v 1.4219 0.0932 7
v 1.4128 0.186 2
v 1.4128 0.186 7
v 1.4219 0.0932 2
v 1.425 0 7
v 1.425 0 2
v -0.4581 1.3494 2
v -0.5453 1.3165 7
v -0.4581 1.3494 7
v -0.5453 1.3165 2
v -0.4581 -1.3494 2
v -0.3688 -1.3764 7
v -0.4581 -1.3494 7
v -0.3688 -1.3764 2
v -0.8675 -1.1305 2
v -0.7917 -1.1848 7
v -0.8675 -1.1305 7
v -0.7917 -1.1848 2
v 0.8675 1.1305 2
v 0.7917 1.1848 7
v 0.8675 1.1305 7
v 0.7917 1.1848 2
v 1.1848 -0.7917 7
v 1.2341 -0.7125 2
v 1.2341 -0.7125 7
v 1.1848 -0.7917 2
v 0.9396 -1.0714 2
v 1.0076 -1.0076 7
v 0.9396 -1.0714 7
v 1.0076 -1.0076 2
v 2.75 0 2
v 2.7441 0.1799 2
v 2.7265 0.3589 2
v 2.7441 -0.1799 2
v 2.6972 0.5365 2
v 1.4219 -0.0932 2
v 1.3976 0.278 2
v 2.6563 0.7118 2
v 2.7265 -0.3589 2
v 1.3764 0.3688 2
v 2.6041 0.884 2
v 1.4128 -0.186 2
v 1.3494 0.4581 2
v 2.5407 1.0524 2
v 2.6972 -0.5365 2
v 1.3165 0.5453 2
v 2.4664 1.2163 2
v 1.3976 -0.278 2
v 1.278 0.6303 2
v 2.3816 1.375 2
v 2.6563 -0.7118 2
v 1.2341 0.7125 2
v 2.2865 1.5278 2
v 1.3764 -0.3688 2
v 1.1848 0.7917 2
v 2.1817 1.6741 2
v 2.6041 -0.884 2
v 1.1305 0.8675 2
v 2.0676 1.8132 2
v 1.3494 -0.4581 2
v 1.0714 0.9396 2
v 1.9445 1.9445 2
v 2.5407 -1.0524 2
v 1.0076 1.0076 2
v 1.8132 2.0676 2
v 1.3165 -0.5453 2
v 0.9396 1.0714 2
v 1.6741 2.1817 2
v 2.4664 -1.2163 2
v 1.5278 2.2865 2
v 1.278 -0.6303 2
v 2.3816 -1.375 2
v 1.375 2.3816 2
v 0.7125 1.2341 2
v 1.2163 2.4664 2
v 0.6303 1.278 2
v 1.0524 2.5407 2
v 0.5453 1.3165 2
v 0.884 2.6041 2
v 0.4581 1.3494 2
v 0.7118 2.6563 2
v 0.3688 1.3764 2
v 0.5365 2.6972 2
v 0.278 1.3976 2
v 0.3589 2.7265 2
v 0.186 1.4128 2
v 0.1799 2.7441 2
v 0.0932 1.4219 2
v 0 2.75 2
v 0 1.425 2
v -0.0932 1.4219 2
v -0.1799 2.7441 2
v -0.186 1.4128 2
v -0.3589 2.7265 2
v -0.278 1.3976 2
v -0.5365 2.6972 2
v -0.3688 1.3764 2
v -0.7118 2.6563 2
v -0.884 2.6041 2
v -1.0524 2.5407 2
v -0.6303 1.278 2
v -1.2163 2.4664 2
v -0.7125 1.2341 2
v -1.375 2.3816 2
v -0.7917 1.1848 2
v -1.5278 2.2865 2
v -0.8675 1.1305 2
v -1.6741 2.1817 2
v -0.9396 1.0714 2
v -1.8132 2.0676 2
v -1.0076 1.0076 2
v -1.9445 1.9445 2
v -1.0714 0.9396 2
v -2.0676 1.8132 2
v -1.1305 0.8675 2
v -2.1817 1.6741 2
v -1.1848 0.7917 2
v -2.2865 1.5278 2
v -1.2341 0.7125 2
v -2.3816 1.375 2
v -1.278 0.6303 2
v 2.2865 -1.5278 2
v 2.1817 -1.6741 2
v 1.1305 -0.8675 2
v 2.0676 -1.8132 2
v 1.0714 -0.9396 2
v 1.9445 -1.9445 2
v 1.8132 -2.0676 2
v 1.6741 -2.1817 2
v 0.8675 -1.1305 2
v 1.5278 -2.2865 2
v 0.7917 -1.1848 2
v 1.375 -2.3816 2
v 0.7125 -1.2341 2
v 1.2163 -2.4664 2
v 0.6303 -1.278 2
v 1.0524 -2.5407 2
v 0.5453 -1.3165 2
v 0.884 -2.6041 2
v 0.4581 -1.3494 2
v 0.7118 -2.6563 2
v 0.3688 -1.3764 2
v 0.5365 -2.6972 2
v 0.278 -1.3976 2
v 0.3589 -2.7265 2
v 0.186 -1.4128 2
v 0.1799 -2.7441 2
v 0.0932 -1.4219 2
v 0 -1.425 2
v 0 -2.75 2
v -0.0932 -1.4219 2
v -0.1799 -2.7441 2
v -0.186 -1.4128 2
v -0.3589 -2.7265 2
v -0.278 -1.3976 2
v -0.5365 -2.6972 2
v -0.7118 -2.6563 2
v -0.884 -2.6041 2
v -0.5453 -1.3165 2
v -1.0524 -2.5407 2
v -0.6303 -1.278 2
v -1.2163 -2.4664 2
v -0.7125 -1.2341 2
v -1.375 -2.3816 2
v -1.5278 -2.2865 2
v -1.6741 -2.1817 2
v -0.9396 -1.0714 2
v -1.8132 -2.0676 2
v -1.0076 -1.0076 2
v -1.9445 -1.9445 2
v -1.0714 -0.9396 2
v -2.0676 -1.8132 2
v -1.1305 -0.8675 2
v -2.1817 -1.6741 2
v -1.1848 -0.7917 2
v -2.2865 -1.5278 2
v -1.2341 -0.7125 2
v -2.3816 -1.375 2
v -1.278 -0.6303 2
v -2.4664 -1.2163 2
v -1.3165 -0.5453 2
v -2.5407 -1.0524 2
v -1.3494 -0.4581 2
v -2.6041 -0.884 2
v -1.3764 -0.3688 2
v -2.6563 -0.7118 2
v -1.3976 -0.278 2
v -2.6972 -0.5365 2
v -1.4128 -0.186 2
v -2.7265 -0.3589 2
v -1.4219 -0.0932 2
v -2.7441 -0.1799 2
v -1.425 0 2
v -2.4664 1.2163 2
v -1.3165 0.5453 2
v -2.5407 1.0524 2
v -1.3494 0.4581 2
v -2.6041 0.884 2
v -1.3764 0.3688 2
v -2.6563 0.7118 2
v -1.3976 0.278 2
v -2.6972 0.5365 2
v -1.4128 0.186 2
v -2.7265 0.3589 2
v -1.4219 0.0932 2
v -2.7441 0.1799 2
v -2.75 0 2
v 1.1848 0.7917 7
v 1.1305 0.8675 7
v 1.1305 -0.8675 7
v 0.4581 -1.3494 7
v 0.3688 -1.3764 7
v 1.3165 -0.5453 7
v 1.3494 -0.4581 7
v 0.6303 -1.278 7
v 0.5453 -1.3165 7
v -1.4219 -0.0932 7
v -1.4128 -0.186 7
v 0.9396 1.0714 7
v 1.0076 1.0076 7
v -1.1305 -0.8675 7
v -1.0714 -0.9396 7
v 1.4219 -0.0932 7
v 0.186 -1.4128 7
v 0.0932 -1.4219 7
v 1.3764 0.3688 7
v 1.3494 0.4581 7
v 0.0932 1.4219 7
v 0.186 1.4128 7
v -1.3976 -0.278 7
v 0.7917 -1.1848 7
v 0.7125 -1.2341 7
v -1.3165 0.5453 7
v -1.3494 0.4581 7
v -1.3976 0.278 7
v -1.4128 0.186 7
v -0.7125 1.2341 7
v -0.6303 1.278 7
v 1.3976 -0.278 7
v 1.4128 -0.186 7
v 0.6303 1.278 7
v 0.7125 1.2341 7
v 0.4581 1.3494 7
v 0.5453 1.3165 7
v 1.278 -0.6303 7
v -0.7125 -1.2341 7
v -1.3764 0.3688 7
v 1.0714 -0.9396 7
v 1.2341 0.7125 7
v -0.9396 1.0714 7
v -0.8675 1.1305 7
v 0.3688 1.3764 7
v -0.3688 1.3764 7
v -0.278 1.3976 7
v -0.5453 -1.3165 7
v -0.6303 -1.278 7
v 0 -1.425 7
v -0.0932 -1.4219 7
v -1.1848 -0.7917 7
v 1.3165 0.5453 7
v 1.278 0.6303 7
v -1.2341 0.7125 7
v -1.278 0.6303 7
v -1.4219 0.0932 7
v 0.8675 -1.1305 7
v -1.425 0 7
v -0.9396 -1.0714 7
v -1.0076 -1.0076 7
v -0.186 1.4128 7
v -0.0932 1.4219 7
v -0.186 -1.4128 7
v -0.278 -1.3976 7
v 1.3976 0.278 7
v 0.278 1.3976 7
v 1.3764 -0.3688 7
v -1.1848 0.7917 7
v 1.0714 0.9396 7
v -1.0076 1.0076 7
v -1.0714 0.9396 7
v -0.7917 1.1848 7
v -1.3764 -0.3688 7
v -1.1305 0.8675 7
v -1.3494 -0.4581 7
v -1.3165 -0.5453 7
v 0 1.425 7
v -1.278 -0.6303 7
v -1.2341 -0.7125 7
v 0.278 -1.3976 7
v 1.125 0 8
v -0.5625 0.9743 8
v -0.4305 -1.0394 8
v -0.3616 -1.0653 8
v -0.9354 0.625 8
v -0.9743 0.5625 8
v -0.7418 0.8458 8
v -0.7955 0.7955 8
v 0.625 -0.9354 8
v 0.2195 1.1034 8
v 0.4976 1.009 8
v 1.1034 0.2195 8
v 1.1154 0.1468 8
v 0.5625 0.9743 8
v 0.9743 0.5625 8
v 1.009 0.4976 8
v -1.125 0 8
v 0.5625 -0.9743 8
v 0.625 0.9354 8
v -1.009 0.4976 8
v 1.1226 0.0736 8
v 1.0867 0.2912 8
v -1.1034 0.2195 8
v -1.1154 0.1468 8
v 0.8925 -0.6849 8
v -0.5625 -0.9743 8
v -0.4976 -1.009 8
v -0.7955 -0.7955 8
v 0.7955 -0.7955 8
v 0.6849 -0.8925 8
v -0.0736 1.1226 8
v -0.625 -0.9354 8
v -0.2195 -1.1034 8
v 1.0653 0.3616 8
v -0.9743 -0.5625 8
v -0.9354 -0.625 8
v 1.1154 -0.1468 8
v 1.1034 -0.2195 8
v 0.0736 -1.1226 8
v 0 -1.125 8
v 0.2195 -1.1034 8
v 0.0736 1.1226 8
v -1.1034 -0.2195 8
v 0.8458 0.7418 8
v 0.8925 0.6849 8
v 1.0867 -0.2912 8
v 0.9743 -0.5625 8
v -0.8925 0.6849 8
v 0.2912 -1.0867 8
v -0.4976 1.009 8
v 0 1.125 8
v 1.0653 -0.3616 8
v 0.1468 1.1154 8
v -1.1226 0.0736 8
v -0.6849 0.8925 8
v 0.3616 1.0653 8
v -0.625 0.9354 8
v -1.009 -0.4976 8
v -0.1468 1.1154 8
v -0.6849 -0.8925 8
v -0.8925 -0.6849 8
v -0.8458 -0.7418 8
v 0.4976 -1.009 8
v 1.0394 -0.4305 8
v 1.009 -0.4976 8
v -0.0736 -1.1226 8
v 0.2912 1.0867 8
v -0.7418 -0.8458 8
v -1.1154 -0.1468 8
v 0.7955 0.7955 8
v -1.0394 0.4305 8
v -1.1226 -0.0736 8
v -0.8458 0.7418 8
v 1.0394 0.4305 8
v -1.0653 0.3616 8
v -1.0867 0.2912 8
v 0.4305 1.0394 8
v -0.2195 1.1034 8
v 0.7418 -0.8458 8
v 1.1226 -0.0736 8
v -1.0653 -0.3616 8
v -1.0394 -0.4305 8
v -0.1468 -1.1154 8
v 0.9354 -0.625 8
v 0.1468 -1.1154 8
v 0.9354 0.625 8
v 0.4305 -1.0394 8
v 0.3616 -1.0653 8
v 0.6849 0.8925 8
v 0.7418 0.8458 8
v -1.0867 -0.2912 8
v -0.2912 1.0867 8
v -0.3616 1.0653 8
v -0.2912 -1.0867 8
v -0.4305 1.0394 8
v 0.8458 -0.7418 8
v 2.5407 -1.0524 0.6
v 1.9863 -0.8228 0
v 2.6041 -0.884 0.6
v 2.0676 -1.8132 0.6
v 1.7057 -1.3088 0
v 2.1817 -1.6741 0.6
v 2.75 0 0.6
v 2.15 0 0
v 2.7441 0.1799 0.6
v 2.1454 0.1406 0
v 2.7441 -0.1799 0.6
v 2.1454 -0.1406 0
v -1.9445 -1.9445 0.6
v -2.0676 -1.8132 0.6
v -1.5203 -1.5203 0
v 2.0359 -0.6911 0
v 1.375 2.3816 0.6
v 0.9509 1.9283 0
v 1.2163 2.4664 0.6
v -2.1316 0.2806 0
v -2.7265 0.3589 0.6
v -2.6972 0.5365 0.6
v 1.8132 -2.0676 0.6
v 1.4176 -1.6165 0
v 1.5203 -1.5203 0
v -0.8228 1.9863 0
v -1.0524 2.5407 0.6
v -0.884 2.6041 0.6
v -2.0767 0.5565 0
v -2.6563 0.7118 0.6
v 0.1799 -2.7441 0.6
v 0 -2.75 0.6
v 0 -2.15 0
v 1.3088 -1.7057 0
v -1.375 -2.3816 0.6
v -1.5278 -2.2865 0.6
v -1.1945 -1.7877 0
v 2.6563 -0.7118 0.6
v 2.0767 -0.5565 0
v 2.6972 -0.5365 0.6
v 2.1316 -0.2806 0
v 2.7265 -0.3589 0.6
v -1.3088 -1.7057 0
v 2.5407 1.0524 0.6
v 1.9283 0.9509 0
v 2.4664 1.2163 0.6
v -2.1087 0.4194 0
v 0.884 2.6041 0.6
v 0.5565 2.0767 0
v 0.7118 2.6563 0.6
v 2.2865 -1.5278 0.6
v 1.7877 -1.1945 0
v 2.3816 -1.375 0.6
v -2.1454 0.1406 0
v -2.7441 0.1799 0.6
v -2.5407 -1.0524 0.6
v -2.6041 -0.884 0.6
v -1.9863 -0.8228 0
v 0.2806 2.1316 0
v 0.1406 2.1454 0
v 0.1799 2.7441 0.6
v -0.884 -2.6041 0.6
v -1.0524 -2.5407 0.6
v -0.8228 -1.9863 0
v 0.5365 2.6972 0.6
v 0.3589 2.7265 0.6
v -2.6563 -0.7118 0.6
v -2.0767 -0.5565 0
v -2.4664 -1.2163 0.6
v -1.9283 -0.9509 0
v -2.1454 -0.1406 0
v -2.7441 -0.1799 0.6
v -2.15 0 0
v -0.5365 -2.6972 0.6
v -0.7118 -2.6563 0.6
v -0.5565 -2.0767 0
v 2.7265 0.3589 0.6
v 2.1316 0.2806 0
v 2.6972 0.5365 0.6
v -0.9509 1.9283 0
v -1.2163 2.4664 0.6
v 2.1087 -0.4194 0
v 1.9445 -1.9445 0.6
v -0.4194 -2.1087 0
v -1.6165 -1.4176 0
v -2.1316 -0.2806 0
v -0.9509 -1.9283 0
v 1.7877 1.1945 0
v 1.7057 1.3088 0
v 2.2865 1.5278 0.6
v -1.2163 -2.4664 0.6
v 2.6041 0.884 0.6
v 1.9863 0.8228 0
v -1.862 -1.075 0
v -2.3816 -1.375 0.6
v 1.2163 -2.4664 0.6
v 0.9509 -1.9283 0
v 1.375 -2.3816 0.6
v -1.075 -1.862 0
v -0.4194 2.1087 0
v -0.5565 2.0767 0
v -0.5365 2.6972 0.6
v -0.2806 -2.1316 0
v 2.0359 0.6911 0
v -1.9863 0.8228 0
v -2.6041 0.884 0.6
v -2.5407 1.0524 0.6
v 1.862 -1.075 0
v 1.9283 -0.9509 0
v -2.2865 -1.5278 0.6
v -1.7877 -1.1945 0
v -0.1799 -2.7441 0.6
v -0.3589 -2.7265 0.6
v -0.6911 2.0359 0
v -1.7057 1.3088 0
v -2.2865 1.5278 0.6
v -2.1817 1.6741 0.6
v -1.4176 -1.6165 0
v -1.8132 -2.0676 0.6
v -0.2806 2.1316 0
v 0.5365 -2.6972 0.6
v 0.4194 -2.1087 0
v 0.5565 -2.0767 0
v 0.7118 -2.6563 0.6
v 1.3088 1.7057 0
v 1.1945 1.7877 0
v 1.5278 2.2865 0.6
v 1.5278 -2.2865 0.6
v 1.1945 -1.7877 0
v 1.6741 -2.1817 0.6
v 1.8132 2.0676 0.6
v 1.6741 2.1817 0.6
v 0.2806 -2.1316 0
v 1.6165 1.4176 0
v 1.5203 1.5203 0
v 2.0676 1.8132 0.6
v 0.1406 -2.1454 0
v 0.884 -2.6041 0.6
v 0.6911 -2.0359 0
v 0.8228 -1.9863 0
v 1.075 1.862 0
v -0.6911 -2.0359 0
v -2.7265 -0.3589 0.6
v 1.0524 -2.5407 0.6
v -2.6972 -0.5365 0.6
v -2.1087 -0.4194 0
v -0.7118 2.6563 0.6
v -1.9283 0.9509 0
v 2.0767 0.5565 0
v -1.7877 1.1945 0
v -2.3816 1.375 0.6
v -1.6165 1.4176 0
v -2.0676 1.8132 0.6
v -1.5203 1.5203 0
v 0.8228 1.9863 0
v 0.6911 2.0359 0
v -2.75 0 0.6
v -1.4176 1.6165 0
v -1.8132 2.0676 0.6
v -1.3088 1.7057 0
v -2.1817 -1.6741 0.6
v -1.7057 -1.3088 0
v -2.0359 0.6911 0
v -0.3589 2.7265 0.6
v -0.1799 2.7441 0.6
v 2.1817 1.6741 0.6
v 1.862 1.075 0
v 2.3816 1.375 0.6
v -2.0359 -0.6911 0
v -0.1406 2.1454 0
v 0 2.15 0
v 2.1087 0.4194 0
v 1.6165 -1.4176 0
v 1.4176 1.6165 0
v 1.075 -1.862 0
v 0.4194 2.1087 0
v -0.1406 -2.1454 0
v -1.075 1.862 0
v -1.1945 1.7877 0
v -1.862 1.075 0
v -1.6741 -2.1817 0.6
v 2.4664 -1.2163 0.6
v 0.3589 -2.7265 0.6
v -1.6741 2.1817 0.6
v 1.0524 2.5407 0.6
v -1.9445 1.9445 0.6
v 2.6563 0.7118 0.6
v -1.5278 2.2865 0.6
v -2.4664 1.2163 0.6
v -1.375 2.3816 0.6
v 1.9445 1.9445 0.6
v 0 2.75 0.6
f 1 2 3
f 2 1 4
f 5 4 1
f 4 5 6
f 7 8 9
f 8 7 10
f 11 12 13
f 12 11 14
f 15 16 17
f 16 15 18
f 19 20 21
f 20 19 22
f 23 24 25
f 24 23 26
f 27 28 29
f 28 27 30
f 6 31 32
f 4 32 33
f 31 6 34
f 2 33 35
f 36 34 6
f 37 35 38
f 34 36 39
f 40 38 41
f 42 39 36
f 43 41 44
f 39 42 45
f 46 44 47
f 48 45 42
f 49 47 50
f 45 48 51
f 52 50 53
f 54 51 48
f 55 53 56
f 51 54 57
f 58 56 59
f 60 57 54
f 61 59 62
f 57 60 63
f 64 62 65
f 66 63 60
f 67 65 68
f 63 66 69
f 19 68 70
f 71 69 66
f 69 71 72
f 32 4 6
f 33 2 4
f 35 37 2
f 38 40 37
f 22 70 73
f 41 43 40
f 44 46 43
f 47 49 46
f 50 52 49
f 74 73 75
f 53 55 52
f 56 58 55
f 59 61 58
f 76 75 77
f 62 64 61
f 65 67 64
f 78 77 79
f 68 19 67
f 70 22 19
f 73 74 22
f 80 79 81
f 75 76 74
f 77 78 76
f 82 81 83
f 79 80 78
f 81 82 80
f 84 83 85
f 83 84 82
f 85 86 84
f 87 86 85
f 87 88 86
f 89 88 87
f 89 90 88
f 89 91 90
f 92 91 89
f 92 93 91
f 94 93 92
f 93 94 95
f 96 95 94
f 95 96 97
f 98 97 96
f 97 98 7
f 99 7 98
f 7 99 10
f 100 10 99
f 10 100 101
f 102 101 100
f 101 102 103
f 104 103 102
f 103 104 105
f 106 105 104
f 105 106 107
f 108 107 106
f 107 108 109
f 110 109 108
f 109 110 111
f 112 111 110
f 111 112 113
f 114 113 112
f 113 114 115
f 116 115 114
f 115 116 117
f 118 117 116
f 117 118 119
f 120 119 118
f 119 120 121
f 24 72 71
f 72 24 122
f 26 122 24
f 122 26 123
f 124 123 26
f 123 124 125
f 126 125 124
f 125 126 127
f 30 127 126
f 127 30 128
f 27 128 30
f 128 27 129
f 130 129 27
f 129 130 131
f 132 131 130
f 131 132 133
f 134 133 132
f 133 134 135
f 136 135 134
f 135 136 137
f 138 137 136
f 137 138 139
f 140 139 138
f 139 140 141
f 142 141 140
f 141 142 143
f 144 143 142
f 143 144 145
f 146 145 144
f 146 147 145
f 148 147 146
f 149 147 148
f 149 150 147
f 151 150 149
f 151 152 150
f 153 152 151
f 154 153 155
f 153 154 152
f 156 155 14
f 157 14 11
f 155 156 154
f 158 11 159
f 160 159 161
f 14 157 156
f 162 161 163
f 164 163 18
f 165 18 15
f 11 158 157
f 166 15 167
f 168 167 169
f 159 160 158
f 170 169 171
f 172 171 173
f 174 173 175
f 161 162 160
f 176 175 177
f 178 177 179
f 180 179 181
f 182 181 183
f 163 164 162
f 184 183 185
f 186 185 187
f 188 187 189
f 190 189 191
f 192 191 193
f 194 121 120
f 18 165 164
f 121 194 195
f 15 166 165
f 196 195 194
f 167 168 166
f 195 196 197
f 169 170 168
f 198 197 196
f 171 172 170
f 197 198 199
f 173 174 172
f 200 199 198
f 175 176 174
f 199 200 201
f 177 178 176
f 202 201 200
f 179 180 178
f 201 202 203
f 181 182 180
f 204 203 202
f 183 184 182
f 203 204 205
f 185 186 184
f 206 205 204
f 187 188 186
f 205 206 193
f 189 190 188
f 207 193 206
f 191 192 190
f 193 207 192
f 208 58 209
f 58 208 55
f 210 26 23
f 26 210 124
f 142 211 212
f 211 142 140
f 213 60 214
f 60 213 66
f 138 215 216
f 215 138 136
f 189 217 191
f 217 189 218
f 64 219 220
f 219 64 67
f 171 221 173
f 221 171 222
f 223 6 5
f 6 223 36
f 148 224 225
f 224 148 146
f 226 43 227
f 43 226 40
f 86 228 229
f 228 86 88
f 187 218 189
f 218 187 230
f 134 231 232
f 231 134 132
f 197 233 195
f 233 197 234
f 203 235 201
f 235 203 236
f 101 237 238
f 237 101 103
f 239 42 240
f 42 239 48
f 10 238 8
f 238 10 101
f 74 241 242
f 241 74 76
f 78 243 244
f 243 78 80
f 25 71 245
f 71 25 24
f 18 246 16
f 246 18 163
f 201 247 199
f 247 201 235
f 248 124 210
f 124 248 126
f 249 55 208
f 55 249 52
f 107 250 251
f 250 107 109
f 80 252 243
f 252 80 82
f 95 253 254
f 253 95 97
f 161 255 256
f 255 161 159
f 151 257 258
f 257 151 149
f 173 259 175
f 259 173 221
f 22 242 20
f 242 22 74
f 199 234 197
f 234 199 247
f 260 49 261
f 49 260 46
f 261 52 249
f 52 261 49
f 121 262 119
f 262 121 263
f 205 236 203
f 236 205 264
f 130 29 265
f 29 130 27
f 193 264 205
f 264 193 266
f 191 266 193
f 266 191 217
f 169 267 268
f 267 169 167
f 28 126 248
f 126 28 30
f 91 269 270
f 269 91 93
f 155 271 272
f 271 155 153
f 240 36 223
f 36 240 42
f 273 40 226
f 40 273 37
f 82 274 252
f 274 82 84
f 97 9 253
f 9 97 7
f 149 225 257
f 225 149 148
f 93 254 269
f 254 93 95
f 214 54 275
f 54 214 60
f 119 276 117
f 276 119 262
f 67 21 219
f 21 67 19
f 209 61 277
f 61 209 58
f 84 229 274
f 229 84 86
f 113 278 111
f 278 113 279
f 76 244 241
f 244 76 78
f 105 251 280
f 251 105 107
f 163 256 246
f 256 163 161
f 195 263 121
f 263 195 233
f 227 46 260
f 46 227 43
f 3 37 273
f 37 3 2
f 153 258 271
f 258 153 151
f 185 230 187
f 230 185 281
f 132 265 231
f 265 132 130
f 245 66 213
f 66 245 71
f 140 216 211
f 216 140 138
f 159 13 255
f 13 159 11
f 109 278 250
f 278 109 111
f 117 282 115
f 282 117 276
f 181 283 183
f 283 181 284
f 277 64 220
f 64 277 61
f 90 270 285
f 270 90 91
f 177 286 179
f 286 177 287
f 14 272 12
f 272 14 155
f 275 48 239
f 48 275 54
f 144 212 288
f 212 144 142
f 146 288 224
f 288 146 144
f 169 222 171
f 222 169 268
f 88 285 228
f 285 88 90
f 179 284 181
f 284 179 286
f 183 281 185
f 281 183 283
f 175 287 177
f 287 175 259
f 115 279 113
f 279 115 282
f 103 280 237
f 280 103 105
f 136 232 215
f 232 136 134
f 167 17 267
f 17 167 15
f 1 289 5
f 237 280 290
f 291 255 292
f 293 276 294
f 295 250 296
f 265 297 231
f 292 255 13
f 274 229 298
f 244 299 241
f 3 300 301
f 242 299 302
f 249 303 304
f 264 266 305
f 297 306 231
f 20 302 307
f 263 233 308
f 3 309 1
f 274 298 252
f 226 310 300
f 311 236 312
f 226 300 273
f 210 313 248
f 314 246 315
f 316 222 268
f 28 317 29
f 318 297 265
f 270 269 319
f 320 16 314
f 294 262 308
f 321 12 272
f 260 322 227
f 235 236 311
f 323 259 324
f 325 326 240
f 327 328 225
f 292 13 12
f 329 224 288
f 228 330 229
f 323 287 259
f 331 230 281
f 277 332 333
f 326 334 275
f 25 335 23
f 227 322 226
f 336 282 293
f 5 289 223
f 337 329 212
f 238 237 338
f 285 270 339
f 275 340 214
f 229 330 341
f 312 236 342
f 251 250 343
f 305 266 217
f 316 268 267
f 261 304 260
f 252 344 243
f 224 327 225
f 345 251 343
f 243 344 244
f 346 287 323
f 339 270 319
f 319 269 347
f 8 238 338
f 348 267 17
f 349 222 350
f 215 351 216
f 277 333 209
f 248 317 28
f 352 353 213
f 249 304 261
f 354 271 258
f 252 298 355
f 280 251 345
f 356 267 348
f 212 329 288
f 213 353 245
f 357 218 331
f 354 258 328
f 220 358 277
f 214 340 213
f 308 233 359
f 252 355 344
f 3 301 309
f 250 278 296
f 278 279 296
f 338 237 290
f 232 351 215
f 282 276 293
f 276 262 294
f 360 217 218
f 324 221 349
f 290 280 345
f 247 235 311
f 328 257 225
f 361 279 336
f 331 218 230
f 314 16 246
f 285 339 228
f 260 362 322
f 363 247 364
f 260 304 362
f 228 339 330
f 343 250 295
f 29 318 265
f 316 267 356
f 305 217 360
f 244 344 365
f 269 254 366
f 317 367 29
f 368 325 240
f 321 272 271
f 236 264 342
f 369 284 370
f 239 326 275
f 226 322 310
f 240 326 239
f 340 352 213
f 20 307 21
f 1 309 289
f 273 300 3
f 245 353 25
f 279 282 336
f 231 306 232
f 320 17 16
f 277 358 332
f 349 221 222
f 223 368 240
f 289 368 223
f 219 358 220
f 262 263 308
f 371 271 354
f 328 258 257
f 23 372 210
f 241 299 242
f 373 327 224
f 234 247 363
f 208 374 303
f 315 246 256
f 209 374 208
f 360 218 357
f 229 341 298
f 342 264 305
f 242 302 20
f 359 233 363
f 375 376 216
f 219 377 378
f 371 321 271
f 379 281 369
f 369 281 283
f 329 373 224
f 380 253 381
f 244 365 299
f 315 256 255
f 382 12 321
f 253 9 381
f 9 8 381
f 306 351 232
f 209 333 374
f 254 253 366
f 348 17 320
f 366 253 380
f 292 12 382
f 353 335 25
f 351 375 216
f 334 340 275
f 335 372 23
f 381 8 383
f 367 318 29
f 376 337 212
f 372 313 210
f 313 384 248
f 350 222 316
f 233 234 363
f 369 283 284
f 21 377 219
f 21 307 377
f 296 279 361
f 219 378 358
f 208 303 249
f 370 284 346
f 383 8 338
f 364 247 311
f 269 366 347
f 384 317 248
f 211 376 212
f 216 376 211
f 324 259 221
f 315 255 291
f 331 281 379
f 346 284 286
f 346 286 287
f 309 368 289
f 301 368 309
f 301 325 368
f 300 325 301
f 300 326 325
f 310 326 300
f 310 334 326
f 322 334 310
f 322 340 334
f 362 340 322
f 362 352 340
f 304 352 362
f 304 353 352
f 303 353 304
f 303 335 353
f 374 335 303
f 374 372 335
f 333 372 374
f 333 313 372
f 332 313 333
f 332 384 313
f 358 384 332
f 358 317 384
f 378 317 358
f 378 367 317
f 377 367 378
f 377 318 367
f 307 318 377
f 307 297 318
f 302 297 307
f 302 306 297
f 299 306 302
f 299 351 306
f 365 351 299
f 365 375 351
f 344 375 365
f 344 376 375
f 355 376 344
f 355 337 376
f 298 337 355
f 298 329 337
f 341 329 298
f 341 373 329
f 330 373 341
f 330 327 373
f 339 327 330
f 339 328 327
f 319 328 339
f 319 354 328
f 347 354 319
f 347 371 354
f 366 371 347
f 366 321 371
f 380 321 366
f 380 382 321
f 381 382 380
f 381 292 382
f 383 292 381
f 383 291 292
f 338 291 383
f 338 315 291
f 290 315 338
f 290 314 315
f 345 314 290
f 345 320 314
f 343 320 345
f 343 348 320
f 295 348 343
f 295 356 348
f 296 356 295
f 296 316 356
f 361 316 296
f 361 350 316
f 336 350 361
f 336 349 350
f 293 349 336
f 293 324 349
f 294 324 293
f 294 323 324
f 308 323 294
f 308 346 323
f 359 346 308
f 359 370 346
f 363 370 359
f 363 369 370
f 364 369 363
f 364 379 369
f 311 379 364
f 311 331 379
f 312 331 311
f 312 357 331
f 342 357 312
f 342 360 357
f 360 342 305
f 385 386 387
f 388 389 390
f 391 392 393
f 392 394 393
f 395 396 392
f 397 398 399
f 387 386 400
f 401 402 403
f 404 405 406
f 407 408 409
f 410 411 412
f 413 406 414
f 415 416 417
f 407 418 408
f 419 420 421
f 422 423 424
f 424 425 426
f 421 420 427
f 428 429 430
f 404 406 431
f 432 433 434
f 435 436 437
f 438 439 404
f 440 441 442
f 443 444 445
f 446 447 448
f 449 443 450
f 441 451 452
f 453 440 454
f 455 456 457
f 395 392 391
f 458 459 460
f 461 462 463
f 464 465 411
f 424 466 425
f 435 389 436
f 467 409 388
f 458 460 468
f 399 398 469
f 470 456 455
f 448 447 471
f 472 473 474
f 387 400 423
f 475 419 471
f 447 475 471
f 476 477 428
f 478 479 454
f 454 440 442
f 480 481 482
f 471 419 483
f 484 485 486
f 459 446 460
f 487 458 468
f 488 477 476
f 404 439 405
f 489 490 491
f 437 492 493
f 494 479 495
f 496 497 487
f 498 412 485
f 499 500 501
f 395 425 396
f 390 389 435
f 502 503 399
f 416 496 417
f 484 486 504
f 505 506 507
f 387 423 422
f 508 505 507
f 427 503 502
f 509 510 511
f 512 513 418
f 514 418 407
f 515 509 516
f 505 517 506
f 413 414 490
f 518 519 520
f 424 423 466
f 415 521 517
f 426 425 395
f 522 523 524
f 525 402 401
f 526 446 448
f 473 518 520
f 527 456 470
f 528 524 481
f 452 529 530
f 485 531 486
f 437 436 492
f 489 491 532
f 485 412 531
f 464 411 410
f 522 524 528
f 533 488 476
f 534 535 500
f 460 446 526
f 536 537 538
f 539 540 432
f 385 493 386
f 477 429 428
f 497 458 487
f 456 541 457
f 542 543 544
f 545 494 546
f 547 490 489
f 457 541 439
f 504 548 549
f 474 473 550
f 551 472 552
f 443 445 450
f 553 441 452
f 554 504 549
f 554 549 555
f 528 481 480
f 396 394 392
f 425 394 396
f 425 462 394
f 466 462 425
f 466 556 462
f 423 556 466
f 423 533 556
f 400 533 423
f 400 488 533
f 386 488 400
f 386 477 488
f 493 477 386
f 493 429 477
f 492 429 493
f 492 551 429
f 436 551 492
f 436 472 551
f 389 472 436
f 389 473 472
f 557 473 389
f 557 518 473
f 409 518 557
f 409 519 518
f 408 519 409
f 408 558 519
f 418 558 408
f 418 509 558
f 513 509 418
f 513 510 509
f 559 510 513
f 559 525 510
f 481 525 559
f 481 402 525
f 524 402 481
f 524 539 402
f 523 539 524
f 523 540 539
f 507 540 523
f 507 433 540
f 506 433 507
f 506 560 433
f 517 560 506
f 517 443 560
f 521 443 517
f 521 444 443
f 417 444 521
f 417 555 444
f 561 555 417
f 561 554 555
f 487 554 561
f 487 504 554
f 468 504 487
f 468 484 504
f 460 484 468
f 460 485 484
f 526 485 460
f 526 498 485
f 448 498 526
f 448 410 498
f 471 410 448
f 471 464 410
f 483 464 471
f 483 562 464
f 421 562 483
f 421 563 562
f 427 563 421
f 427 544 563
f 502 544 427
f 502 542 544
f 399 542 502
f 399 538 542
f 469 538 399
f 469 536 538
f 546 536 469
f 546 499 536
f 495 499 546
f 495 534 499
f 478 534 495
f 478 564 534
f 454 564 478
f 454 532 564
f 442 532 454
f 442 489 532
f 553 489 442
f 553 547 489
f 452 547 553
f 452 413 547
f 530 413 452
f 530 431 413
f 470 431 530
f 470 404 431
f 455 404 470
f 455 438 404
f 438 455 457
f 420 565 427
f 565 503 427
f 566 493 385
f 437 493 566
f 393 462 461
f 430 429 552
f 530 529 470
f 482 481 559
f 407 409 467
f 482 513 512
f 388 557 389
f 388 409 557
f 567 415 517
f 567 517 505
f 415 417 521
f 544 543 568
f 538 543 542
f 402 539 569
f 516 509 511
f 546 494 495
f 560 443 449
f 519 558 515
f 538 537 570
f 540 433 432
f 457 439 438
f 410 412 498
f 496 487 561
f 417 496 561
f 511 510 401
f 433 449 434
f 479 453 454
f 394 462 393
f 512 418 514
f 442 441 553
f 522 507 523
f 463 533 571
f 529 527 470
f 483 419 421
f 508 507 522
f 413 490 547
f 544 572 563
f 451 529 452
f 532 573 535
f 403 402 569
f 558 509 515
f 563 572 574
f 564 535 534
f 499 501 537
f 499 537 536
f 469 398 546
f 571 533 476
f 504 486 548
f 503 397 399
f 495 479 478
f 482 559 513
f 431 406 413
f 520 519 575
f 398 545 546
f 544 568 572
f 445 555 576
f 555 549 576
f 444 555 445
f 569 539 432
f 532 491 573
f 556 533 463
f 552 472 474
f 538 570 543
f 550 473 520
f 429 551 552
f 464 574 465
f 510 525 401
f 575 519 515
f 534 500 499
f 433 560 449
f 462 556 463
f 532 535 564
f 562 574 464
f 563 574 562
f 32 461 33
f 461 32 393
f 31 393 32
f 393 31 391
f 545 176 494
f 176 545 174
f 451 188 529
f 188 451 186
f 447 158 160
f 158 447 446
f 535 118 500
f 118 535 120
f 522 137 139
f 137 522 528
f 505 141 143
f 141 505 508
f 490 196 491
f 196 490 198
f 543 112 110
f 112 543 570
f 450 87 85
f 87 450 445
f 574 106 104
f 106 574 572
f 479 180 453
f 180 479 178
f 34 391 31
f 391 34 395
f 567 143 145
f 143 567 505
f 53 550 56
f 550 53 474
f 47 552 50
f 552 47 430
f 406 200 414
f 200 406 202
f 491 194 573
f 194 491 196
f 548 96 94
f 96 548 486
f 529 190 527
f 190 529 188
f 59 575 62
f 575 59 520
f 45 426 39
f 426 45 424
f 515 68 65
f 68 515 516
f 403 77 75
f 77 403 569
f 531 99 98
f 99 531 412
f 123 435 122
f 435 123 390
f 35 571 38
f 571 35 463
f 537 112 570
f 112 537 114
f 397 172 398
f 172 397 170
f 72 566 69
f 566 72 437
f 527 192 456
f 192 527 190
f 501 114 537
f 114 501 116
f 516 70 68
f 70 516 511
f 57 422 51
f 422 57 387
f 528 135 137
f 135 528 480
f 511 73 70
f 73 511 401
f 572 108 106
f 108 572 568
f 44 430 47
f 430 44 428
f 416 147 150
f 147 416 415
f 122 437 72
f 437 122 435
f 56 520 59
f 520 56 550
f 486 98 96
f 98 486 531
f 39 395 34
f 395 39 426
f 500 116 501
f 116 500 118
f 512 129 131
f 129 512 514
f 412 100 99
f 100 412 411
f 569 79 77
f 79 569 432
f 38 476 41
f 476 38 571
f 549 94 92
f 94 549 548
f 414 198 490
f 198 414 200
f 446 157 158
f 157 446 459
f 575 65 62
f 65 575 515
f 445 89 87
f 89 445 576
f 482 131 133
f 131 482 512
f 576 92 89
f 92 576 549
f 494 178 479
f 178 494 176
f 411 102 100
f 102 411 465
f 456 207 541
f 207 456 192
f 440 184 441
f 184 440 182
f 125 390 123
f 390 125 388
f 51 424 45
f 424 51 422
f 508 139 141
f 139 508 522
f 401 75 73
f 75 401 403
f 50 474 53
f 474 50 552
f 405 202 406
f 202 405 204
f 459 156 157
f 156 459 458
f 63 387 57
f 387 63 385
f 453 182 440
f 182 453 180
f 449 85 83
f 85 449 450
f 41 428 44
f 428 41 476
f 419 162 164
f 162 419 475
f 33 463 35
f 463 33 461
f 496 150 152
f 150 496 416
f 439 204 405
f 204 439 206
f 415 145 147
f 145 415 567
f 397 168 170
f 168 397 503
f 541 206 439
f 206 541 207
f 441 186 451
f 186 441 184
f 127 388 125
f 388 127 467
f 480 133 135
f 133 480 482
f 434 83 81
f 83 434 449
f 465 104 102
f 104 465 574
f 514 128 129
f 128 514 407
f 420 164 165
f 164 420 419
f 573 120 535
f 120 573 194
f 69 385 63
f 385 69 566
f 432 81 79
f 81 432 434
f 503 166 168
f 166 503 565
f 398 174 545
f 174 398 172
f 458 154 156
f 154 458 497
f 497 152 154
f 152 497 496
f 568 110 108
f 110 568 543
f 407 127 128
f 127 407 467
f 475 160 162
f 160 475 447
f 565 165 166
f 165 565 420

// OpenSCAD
// =====================================================================
// placard_spar_cap.scad  --  P8, carbon spar end cap.  PRINT FOUR.
//
// docs/placard_mount.md 5.2 L537:
//   "P8 | 2 x spar end cap | PETG (print) | 2 g | print -- placard_spar_cap.stl"
// docs/placard_mount.md 5.2 L533 (the tube it caps):
//   "P4 | 2 x O4 x 0.5 mm wall carbon tube, 480 mm (protrudes 15 mm each side
//    of the bottom panel edge)"
// docs/placard_mount.md 7 L744: "placard_spar_cap.stl x 4"
//   (four, not two -- both spars, both ends; L537's "2 g" is the mass of a
//    pair. The build checklist is the authority on the count.)
//
// WHY: a raw carbon tube end is a splintering hazard and a snag point, and the
// bottom spar's protruding ends are the first thing to hit the ground when the
// frangible shoe does its job and the panel departs (5.4). Capping them also
// keeps the tube's bore clean so the cap can be re-fitted after a crash.
//
// *** EVERY DIMENSION IN THIS PART IS [CHOSEN]. *** docs/placard_mount.md
// names the part and gives no geometry whatsoever. See DIMENSIONS TO CONFIRM
// #9 in placard_mount_params.scad.
//
// ORIGIN: centre of the flange, flange bottom face on z = 0, plug pointing +z.
//
// PRINT (all [CHOSEN]): PETG, 0.15 mm layers, 3 perimeters, 60 % infill,
// flange DOWN on the bed, no supports. Small part -- print all four at once
// with a brim. If the plug is tight, sand it; do not force it into the tube
// (0.5 mm carbon wall splits).
// =====================================================================

include <placard_mount_params.scad>

module placard_spar_cap() {
    union() {
        // flange -- slightly proud of the 4.0 mm tube OD so it also acts as a
        // bump stop when the spar end grounds. The OUTER face is z = 0 and it
        // is printed flat on the bed, so the "rounded end" is a chamfer, not a
        // dome: a dome would need supports on a 2 g part.
        cylinder(h = cap_chamfer, d1 = cap_flange_d - 2 * cap_chamfer,
                 d2 = cap_flange_d);
        translate([0, 0, cap_chamfer])
            cylinder(h = cap_flange_h - cap_chamfer, d = cap_flange_d);

        // plug -- light interference in the tube's 3.0 mm bore, with a lead-in
        translate([0, 0, cap_flange_h]) {
            cylinder(h = cap_plug_h - 1.0, d = cap_plug_d);
            translate([0, 0, cap_plug_h - 1.0])
                cylinder(h = 1.0, d1 = cap_plug_d, d2 = cap_plug_d - 0.6);
        }
    }
}

placard_spar_cap();
